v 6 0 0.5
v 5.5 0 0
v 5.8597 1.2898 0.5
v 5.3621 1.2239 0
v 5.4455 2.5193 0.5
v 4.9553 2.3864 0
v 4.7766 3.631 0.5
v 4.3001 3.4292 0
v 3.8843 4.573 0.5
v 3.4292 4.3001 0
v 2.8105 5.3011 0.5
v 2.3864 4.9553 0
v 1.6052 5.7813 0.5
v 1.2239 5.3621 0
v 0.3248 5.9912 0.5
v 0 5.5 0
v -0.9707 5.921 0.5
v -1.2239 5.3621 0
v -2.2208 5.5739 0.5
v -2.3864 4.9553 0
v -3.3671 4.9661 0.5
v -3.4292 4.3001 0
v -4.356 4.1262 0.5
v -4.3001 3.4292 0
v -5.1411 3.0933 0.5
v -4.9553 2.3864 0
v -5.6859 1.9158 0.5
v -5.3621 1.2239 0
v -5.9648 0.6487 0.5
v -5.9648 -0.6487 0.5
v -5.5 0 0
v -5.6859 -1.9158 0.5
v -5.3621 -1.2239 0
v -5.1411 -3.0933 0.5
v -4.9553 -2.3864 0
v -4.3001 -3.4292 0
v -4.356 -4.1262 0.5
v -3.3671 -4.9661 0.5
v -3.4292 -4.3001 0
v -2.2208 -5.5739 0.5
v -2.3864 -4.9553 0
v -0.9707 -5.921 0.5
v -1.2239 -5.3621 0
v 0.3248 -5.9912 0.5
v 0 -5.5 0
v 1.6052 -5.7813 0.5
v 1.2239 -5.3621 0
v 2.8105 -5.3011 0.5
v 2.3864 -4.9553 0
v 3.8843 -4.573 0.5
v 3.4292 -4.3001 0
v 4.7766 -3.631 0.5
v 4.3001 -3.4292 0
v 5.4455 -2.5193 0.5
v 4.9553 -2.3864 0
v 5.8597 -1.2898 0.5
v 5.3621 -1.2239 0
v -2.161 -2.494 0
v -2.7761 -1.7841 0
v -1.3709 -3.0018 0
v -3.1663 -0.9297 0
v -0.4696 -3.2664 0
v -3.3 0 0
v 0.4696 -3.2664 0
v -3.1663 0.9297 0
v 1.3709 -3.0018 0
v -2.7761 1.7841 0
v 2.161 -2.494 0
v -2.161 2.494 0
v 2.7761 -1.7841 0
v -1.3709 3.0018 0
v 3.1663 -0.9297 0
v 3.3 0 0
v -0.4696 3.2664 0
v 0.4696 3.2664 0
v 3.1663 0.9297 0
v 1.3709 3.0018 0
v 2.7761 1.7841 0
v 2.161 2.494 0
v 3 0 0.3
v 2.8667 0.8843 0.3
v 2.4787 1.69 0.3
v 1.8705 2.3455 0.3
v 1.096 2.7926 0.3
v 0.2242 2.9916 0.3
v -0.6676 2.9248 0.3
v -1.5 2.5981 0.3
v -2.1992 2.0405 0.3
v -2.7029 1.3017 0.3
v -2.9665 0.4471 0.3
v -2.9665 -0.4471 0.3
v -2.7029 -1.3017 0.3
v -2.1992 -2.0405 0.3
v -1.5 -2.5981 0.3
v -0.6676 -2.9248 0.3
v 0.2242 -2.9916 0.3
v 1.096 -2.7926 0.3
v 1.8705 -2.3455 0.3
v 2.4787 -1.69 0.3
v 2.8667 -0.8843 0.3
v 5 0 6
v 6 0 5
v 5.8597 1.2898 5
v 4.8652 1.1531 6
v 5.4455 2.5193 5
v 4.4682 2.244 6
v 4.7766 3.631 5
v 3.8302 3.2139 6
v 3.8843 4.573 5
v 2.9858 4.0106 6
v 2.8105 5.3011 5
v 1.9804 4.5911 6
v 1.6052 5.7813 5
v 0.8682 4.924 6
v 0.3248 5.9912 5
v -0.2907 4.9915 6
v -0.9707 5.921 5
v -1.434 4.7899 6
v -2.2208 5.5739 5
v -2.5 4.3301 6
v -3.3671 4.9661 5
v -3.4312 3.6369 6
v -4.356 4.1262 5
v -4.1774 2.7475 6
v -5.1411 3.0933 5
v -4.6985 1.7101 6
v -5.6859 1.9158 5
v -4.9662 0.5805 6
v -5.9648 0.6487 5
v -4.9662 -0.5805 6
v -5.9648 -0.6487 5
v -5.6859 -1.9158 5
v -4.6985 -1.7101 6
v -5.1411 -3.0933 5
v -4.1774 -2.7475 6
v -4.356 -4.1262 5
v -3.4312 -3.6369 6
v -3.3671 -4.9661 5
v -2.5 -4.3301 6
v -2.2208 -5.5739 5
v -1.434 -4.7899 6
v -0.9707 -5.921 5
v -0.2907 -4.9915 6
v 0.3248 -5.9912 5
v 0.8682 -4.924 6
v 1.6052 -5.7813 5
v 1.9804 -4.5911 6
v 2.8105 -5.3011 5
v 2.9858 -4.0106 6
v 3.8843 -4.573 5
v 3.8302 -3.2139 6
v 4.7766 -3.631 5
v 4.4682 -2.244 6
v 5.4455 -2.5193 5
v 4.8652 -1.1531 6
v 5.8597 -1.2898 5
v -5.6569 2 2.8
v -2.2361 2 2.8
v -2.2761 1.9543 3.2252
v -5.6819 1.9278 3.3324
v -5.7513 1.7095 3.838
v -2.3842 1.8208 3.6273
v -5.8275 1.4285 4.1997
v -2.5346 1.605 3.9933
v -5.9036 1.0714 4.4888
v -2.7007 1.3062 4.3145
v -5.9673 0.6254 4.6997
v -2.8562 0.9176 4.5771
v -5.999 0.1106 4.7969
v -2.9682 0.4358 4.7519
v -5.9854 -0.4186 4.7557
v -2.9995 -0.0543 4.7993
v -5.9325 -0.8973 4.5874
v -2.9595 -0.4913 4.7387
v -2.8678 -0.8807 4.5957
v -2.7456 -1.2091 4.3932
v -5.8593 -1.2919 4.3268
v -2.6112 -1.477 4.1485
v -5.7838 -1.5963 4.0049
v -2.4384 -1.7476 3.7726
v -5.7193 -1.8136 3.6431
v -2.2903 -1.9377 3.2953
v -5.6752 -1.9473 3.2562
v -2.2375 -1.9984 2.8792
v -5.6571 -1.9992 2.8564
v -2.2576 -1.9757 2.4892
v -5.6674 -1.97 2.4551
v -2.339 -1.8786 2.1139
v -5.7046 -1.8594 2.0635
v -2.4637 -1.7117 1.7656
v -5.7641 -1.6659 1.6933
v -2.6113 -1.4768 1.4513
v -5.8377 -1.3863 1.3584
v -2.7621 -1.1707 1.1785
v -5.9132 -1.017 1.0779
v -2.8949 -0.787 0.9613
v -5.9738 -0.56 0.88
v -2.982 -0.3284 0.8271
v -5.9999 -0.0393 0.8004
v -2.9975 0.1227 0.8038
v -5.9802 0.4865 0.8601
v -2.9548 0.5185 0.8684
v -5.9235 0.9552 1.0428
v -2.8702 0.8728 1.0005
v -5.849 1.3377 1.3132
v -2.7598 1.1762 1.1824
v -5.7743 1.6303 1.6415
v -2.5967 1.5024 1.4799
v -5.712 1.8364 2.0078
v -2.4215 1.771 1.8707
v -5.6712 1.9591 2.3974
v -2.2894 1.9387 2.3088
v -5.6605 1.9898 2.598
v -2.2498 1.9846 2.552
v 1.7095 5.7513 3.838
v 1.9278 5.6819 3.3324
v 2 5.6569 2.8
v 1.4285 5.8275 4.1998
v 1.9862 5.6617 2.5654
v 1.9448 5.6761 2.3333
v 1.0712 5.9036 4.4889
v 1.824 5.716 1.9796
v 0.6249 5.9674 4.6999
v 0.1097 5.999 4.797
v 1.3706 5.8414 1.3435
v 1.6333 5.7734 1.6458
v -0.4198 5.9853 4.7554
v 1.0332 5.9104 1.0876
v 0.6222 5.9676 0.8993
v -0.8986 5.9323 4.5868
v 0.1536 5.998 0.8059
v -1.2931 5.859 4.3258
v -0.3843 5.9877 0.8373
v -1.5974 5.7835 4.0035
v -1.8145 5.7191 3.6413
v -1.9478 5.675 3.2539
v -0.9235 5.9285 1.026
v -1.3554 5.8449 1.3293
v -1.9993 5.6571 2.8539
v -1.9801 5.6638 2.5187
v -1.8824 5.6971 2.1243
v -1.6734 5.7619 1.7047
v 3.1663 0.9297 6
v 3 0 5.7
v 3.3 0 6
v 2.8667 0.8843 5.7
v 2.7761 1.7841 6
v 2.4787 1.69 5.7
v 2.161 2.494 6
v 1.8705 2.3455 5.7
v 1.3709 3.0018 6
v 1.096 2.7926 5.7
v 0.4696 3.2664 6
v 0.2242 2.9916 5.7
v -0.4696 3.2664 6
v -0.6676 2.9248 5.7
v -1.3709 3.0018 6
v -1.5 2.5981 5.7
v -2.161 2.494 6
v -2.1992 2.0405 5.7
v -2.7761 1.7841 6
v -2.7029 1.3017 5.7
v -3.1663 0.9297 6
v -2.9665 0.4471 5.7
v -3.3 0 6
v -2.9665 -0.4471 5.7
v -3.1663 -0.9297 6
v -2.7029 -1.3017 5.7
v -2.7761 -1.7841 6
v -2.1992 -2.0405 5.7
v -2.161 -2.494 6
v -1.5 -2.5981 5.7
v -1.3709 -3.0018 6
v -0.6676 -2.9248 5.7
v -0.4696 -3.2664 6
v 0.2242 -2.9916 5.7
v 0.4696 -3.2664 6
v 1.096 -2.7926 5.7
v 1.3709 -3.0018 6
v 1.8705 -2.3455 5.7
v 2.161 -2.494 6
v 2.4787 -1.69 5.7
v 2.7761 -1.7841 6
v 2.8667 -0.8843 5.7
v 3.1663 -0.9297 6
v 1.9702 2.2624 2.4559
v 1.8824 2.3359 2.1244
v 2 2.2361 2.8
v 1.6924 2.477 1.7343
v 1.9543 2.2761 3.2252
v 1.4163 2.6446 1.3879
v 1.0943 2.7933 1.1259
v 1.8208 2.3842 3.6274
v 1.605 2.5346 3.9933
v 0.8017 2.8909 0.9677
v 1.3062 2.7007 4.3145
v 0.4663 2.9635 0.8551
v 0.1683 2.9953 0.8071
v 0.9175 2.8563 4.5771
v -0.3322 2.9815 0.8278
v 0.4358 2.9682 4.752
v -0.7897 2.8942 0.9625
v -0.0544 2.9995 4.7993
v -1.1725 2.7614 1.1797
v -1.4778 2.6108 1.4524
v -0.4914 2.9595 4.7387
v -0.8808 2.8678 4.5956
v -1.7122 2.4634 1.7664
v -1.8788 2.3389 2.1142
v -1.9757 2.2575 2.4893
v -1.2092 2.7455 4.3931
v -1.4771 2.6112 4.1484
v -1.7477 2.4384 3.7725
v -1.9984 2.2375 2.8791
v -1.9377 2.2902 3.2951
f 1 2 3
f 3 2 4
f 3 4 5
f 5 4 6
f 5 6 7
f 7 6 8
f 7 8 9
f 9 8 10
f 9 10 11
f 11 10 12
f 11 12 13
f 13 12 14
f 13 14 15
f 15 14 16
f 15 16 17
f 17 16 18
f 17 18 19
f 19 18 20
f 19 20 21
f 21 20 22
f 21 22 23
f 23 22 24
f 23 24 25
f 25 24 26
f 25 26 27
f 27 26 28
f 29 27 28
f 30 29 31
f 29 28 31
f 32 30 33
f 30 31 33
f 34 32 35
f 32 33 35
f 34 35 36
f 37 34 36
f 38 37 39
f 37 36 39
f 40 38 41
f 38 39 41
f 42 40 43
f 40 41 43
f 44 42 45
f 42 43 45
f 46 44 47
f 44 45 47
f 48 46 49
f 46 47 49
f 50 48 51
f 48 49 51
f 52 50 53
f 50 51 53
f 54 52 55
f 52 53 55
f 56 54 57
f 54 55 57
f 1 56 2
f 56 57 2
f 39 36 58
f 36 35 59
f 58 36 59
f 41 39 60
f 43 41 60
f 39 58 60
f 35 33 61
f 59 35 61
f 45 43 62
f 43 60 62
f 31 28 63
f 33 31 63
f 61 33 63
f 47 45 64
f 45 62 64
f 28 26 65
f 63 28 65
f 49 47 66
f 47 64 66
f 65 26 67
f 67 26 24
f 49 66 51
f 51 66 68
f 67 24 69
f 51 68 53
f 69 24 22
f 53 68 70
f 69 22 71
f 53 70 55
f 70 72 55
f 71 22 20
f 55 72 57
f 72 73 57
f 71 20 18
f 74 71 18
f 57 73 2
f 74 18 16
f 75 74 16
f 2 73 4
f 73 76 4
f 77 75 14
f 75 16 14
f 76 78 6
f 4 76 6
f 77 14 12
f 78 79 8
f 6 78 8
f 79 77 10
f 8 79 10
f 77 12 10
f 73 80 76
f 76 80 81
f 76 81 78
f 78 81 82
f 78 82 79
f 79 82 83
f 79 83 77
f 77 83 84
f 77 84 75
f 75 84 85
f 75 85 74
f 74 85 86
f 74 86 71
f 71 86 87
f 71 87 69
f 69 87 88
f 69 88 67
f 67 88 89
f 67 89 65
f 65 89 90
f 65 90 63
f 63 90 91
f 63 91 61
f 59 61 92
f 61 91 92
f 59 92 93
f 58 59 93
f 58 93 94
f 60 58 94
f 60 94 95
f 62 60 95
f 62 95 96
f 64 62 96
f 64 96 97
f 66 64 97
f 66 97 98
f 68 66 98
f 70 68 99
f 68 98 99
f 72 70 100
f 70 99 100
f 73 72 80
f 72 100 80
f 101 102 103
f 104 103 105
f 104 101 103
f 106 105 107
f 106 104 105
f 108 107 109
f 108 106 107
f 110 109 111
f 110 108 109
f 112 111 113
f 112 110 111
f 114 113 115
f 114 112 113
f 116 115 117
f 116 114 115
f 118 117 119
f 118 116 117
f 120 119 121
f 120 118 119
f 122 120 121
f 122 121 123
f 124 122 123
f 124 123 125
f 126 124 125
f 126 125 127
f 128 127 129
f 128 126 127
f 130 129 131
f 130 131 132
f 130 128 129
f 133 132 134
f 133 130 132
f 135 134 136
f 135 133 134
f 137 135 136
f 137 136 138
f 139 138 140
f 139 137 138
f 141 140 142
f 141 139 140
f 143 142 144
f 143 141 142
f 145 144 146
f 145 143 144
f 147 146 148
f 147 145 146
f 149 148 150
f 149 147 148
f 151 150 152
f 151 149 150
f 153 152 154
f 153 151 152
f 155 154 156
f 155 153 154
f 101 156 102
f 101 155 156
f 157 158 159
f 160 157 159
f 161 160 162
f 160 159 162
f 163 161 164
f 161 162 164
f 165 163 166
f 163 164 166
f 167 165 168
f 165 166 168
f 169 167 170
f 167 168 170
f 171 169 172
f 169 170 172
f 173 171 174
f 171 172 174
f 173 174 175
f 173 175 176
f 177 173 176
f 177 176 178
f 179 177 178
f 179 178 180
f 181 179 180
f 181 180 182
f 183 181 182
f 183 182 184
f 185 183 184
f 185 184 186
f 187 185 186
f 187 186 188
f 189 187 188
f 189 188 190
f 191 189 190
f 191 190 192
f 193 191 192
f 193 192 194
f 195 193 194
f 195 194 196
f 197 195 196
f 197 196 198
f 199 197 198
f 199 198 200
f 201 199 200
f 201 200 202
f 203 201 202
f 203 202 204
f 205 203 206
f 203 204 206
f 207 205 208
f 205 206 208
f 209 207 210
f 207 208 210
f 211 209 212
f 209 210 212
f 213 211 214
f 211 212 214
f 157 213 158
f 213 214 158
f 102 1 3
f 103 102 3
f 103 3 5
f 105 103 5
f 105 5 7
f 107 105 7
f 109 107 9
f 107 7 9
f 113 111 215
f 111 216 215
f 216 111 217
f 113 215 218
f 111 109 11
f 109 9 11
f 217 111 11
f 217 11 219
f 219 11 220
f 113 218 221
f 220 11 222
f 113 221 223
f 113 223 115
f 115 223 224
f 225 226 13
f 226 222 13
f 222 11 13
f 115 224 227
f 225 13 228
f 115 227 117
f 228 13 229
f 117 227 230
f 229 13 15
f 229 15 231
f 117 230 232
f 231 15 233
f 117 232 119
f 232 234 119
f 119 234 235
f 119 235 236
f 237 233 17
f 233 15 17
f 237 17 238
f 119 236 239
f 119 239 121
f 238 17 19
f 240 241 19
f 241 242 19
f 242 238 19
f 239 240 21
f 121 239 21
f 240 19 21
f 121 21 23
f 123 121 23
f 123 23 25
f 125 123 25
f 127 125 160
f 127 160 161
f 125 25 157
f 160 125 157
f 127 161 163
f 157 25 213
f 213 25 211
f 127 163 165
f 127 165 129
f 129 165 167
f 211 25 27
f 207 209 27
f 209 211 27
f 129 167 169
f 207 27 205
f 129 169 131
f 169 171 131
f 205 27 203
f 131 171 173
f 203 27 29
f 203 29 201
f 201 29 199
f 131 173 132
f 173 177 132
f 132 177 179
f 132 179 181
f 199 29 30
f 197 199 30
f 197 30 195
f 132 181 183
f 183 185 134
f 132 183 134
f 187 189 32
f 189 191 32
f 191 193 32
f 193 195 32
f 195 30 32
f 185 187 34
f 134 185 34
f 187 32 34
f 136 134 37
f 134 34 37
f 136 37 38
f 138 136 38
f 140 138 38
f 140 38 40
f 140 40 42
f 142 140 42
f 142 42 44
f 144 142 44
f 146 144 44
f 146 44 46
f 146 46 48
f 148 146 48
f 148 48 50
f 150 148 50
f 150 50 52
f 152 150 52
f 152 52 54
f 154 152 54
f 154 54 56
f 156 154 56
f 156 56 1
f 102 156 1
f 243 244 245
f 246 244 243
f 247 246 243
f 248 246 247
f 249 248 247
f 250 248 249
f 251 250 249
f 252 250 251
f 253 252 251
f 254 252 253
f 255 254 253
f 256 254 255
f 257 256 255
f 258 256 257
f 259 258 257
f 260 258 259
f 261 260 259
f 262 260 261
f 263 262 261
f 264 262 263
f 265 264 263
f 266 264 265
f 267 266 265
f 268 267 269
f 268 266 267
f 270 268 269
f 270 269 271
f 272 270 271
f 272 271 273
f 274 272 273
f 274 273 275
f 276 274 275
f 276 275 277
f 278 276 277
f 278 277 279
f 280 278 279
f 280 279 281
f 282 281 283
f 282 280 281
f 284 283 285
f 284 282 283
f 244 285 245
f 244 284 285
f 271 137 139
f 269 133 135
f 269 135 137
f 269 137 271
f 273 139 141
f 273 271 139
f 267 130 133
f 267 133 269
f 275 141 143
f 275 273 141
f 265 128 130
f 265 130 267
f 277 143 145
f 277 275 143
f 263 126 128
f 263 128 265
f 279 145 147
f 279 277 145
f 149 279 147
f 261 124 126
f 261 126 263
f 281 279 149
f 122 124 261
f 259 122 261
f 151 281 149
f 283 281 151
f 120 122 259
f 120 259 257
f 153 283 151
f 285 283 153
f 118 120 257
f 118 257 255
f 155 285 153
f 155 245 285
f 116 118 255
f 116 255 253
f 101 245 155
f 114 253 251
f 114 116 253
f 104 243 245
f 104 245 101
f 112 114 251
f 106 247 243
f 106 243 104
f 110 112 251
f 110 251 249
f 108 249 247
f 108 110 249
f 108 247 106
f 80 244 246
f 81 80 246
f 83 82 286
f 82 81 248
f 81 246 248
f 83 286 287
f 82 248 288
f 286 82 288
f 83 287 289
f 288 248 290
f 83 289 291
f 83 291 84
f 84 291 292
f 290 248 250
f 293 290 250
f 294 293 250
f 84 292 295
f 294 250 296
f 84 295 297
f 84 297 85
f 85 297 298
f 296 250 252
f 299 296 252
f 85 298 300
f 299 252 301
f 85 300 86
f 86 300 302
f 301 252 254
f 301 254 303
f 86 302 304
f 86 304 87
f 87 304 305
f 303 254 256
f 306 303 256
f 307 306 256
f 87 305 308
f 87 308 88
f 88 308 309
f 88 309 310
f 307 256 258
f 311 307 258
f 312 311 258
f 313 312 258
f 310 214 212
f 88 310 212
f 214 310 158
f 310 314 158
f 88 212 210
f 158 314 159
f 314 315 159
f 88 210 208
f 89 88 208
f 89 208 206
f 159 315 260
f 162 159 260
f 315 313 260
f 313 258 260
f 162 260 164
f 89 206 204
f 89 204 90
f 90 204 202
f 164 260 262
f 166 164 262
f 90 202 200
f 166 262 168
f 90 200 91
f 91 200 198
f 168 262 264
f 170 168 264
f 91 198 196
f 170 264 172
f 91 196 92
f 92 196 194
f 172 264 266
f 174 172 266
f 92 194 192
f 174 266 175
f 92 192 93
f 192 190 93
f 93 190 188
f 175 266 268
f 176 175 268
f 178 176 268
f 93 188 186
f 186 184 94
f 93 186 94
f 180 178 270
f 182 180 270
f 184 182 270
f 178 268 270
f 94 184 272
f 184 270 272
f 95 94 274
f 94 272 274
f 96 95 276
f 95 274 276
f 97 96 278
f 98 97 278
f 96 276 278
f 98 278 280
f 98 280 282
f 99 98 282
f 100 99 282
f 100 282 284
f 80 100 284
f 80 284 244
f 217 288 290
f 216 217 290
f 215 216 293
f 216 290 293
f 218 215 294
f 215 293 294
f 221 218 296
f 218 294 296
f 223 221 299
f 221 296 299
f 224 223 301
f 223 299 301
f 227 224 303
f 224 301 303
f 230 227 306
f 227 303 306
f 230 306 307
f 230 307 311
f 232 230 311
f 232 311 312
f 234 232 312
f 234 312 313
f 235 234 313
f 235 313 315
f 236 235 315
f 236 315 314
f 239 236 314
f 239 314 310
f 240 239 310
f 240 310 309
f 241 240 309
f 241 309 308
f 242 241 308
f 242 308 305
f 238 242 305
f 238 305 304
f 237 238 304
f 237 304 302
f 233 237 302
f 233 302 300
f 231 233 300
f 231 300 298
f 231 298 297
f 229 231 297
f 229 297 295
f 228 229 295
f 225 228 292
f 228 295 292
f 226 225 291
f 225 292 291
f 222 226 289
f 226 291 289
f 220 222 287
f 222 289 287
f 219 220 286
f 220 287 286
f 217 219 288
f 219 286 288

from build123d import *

# Parameters (mm, degrees)
SKETCH_R        = 6
PAD_DEPTH       = 6
SKETCH001_R     = 3
POCKET_DEPTH    = 6.001
CHAMFER_SIZE    = 1
CHAMFER001_SIZE = 0.3
CHAMFER002_SIZE = 0.5
CHAMFER003_SIZE = 0.3
SKETCH002_R     = 2
POCKET001_DEPTH = 6.001
SKETCH003_R     = 2
POCKET002_DEPTH = 6.001


with BuildPart() as part:
    # Sketch → Pad (new body)
    with BuildSketch(Plane.XY):
        Circle(SKETCH_R)
    extrude(amount=PAD_DEPTH)

    # Sketch001 (on Face3 of Pad) → Pocket (cut, through all)
    with BuildSketch(Plane.XY.offset(6)):
        Circle(SKETCH001_R)
    extrude(amount=-POCKET_DEPTH, mode=Mode.SUBTRACT)

    # Chamfer
    chamfer_edges = [part.edges().sort_by_distance(p)[0] for p in [
        (-6, 0, 6),
    ]]
    chamfer(chamfer_edges, length=CHAMFER_SIZE)

    # Chamfer001
    chamfer001_edges = [part.edges().sort_by_distance(p)[0] for p in [
        (-3, 0, 6),
    ]]
    chamfer(chamfer001_edges, length=CHAMFER001_SIZE)

    # Chamfer002
    chamfer002_edges = [part.edges().sort_by_distance(p)[0] for p in [
        (-6, 0, 0),
    ]]
    chamfer(chamfer002_edges, length=CHAMFER002_SIZE)

    # Chamfer003
    chamfer003_edges = [part.edges().sort_by_distance(p)[0] for p in [
        (-3, 0, 0),
    ]]
    chamfer(chamfer003_edges, length=CHAMFER003_SIZE)

    # Sketch002 → Pocket001 (cut, through all)
    with BuildSketch(Plane.YZ):
        with Locations((0, 2.8)):
            Circle(SKETCH002_R)
    extrude(amount=-POCKET001_DEPTH, mode=Mode.SUBTRACT)

    # Sketch003 → Pocket002 (cut, through all)
    with BuildSketch(Plane.XZ):
        with Locations((0, 2.8)):
            Circle(SKETCH003_R)
    extrude(amount=-POCKET002_DEPTH, mode=Mode.SUBTRACT)


solid = part.part
